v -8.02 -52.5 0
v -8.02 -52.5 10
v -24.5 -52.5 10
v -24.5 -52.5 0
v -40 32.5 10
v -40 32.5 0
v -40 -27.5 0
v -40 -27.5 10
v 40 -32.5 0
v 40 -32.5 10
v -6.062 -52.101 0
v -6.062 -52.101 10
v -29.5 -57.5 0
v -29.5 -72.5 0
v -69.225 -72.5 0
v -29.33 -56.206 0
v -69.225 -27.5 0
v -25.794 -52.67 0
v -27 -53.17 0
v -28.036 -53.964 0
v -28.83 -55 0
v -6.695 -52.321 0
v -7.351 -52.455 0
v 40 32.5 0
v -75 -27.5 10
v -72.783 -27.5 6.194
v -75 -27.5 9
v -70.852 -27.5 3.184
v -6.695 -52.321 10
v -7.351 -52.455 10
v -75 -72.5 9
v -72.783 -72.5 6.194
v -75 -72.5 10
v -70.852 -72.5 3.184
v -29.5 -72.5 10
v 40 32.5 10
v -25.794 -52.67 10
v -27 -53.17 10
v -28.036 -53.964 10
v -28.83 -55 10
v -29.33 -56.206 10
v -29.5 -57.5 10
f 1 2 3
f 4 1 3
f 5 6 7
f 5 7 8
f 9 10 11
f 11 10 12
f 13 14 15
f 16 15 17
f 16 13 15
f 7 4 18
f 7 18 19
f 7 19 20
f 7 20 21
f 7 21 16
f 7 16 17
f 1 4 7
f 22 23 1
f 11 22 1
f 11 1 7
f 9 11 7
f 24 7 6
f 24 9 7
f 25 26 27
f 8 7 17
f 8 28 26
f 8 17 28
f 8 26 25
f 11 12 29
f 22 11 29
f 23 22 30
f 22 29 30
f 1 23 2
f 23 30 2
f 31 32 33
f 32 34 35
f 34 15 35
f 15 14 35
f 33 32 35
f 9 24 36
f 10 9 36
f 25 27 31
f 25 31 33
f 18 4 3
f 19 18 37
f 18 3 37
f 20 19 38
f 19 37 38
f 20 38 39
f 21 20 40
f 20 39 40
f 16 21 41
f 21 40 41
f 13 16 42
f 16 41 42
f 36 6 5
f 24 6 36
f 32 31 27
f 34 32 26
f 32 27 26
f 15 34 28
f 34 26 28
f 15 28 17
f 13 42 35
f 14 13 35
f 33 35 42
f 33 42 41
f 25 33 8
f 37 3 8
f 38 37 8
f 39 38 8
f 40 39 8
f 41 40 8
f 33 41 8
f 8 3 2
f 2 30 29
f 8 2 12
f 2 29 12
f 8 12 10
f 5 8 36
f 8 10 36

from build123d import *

# Parameters (mm, degrees)
SKETCH1_W           = 80
SKETCH1_H           = 65
BOSS_EXTRUDE1_DEPTH = 10
SKETCH3_W           = 80
SKETCH3_H           = 10
BOSS_EXTRUDE2_DEPTH = 40
SKETCH4_W           = 10
SKETCH4_H           = 45
BOSS_EXTRUDE3_DEPTH = 35
SKETCH5_R           = 36.5
CUT_EXTRUDE2_DEPTH  = 97.566039579
CUT_EXTRUDE3_DEPTH  = 105.791459576


with BuildPart() as part:
    # Sketch1 → Boss-Extrude1 (new body)
    with BuildSketch(Plane.XY):
        Rectangle(SKETCH1_W, SKETCH1_H)
    extrude(amount=BOSS_EXTRUDE1_DEPTH)

    # Sketch3 → Boss-Extrude2 (add)
    with BuildSketch(Plane.XZ.offset(32.5)):
        with Locations((0, 5)):
            Rectangle(SKETCH3_W, SKETCH3_H)
    extrude(amount=BOSS_EXTRUDE2_DEPTH)

    # Sketch4 → Boss-Extrude3 (add)
    with BuildSketch(Plane.ZY.offset(40)):
        with Locations((5, -50)):
            Rectangle(SKETCH4_W, SKETCH4_H)
    extrude(amount=BOSS_EXTRUDE3_DEPTH)

    # Sketch5 → Cut-Extrude2 (cut, through all)
    with BuildSketch(Plane(origin=(0, -27.5, 0), x_dir=(1, 0, 0), z_dir=(0, 1, 0))):
        with Locations((-102.5, 15)):
            Circle(SKETCH5_R)
    extrude(amount=-CUT_EXTRUDE2_DEPTH, mode=Mode.SUBTRACT)

    # Sketch6 → Cut-Extrude3 (cut, through all)
    with BuildSketch(Plane.XY.offset(10)):
        with BuildLine():
            Line((-29.5, -72.5), (40, -72.5))
            Line((40, -72.5), (40, -32.5))
            Line((40, -32.5), (-6.061816969, -52.100773178))
            ThreePointArc((-6.061816969, -52.100773178), (-7.020559729, -52.399176762), (-8.019592789, -52.5))
            Line((-8.019592789, -52.5), (-24.5, -52.5))
            ThreePointArc((-24.5, -52.5), (-28.035533906, -53.964466094), (-29.5, -57.5))
            Line((-29.5, -57.5), (-29.5, -72.5))
        make_face()
    extrude(amount=-CUT_EXTRUDE3_DEPTH, mode=Mode.SUBTRACT)


solid = part.part
